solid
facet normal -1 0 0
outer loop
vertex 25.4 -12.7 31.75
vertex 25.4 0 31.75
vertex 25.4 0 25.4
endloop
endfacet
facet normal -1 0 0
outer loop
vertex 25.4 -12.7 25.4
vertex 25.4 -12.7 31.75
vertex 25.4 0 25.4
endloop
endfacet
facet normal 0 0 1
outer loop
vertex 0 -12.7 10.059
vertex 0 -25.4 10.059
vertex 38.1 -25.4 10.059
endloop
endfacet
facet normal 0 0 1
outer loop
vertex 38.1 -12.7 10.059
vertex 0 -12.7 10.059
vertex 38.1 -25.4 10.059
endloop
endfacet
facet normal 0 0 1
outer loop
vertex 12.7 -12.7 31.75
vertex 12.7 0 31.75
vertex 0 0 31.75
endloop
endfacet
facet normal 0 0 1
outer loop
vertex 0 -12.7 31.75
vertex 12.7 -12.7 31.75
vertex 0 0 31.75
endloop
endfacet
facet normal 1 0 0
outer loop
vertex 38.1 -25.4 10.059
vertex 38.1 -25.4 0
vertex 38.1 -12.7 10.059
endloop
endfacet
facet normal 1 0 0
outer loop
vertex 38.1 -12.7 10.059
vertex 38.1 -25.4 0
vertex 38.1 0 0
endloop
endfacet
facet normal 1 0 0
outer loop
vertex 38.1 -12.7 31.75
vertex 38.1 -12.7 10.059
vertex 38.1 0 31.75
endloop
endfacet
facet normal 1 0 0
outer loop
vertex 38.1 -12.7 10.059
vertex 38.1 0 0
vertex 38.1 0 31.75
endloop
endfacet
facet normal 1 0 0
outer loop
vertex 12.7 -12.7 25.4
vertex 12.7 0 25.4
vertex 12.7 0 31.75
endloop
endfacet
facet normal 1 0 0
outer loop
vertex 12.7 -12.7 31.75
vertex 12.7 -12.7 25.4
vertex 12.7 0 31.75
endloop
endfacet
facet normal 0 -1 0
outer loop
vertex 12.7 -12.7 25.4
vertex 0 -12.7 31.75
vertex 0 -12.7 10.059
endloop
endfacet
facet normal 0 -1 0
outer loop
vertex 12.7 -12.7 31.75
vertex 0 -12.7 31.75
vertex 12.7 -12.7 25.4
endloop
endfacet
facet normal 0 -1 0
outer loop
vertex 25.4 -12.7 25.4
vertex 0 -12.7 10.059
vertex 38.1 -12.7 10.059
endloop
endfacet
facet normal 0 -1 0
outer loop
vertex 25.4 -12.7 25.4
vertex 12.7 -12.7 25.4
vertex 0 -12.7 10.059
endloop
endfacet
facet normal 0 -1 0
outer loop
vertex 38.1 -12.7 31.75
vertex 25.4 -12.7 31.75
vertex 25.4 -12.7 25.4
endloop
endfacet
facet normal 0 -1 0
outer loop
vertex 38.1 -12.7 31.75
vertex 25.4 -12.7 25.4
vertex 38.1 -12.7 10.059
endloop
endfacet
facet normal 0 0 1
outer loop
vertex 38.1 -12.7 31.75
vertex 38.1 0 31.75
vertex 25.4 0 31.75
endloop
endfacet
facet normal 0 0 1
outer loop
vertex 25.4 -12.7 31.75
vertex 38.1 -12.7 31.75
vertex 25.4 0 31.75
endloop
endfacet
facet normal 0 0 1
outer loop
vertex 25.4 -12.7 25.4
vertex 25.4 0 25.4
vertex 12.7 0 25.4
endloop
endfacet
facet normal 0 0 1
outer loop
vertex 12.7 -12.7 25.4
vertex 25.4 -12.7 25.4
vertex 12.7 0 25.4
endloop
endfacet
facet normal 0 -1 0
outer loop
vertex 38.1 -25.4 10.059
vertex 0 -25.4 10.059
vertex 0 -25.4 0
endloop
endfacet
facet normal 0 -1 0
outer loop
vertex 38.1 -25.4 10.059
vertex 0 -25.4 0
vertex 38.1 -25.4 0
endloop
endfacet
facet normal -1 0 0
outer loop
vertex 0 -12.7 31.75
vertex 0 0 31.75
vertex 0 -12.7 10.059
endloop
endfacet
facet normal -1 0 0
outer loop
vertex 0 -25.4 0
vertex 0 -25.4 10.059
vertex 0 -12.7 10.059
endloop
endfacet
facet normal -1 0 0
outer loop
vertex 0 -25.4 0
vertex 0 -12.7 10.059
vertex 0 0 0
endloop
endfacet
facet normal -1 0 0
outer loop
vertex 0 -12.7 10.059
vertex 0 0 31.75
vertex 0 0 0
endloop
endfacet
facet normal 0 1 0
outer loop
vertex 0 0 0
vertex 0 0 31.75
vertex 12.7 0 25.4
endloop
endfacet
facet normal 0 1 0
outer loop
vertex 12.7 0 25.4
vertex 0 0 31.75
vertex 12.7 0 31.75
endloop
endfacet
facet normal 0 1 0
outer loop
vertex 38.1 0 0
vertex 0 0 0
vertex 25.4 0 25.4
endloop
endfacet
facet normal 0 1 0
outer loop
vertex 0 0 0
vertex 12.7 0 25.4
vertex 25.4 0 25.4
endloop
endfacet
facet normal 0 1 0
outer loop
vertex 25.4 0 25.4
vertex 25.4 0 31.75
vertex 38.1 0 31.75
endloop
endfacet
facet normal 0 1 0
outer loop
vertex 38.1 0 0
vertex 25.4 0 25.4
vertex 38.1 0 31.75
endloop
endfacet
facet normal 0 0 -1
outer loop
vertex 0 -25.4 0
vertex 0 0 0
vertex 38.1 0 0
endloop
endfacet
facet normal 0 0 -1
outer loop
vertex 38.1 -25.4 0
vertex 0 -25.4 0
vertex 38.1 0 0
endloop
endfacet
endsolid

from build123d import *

# Parameters (mm, degrees)
F1_DEPTH = 25.4
F3_DEPTH = 12.7


with BuildPart() as f1:
    # F0 (on Front) → F1 (new body)
    with BuildSketch(Plane.XZ):
        Polygon((0, 31.75), (0, 0), (38.1, 0), (38.1, 31.75), (25.4, 31.75), (25.4, 25.4), (12.7, 25.4), (12.7, 31.75), align=None)
    extrude(amount=F1_DEPTH)

    # F2 (on face) → F3 (cut)
    with BuildSketch(Plane.XZ.offset(25.4)):
        Polygon((0, 31.75), (0, 10.059285), (38.1, 10.059285), (38.1, 31.75), (25.4, 31.75), (25.4, 25.4), (12.7, 25.4), (12.7, 31.75), align=None)
    extrude(amount=-F3_DEPTH, mode=Mode.SUBTRACT)


solid = f1.part
